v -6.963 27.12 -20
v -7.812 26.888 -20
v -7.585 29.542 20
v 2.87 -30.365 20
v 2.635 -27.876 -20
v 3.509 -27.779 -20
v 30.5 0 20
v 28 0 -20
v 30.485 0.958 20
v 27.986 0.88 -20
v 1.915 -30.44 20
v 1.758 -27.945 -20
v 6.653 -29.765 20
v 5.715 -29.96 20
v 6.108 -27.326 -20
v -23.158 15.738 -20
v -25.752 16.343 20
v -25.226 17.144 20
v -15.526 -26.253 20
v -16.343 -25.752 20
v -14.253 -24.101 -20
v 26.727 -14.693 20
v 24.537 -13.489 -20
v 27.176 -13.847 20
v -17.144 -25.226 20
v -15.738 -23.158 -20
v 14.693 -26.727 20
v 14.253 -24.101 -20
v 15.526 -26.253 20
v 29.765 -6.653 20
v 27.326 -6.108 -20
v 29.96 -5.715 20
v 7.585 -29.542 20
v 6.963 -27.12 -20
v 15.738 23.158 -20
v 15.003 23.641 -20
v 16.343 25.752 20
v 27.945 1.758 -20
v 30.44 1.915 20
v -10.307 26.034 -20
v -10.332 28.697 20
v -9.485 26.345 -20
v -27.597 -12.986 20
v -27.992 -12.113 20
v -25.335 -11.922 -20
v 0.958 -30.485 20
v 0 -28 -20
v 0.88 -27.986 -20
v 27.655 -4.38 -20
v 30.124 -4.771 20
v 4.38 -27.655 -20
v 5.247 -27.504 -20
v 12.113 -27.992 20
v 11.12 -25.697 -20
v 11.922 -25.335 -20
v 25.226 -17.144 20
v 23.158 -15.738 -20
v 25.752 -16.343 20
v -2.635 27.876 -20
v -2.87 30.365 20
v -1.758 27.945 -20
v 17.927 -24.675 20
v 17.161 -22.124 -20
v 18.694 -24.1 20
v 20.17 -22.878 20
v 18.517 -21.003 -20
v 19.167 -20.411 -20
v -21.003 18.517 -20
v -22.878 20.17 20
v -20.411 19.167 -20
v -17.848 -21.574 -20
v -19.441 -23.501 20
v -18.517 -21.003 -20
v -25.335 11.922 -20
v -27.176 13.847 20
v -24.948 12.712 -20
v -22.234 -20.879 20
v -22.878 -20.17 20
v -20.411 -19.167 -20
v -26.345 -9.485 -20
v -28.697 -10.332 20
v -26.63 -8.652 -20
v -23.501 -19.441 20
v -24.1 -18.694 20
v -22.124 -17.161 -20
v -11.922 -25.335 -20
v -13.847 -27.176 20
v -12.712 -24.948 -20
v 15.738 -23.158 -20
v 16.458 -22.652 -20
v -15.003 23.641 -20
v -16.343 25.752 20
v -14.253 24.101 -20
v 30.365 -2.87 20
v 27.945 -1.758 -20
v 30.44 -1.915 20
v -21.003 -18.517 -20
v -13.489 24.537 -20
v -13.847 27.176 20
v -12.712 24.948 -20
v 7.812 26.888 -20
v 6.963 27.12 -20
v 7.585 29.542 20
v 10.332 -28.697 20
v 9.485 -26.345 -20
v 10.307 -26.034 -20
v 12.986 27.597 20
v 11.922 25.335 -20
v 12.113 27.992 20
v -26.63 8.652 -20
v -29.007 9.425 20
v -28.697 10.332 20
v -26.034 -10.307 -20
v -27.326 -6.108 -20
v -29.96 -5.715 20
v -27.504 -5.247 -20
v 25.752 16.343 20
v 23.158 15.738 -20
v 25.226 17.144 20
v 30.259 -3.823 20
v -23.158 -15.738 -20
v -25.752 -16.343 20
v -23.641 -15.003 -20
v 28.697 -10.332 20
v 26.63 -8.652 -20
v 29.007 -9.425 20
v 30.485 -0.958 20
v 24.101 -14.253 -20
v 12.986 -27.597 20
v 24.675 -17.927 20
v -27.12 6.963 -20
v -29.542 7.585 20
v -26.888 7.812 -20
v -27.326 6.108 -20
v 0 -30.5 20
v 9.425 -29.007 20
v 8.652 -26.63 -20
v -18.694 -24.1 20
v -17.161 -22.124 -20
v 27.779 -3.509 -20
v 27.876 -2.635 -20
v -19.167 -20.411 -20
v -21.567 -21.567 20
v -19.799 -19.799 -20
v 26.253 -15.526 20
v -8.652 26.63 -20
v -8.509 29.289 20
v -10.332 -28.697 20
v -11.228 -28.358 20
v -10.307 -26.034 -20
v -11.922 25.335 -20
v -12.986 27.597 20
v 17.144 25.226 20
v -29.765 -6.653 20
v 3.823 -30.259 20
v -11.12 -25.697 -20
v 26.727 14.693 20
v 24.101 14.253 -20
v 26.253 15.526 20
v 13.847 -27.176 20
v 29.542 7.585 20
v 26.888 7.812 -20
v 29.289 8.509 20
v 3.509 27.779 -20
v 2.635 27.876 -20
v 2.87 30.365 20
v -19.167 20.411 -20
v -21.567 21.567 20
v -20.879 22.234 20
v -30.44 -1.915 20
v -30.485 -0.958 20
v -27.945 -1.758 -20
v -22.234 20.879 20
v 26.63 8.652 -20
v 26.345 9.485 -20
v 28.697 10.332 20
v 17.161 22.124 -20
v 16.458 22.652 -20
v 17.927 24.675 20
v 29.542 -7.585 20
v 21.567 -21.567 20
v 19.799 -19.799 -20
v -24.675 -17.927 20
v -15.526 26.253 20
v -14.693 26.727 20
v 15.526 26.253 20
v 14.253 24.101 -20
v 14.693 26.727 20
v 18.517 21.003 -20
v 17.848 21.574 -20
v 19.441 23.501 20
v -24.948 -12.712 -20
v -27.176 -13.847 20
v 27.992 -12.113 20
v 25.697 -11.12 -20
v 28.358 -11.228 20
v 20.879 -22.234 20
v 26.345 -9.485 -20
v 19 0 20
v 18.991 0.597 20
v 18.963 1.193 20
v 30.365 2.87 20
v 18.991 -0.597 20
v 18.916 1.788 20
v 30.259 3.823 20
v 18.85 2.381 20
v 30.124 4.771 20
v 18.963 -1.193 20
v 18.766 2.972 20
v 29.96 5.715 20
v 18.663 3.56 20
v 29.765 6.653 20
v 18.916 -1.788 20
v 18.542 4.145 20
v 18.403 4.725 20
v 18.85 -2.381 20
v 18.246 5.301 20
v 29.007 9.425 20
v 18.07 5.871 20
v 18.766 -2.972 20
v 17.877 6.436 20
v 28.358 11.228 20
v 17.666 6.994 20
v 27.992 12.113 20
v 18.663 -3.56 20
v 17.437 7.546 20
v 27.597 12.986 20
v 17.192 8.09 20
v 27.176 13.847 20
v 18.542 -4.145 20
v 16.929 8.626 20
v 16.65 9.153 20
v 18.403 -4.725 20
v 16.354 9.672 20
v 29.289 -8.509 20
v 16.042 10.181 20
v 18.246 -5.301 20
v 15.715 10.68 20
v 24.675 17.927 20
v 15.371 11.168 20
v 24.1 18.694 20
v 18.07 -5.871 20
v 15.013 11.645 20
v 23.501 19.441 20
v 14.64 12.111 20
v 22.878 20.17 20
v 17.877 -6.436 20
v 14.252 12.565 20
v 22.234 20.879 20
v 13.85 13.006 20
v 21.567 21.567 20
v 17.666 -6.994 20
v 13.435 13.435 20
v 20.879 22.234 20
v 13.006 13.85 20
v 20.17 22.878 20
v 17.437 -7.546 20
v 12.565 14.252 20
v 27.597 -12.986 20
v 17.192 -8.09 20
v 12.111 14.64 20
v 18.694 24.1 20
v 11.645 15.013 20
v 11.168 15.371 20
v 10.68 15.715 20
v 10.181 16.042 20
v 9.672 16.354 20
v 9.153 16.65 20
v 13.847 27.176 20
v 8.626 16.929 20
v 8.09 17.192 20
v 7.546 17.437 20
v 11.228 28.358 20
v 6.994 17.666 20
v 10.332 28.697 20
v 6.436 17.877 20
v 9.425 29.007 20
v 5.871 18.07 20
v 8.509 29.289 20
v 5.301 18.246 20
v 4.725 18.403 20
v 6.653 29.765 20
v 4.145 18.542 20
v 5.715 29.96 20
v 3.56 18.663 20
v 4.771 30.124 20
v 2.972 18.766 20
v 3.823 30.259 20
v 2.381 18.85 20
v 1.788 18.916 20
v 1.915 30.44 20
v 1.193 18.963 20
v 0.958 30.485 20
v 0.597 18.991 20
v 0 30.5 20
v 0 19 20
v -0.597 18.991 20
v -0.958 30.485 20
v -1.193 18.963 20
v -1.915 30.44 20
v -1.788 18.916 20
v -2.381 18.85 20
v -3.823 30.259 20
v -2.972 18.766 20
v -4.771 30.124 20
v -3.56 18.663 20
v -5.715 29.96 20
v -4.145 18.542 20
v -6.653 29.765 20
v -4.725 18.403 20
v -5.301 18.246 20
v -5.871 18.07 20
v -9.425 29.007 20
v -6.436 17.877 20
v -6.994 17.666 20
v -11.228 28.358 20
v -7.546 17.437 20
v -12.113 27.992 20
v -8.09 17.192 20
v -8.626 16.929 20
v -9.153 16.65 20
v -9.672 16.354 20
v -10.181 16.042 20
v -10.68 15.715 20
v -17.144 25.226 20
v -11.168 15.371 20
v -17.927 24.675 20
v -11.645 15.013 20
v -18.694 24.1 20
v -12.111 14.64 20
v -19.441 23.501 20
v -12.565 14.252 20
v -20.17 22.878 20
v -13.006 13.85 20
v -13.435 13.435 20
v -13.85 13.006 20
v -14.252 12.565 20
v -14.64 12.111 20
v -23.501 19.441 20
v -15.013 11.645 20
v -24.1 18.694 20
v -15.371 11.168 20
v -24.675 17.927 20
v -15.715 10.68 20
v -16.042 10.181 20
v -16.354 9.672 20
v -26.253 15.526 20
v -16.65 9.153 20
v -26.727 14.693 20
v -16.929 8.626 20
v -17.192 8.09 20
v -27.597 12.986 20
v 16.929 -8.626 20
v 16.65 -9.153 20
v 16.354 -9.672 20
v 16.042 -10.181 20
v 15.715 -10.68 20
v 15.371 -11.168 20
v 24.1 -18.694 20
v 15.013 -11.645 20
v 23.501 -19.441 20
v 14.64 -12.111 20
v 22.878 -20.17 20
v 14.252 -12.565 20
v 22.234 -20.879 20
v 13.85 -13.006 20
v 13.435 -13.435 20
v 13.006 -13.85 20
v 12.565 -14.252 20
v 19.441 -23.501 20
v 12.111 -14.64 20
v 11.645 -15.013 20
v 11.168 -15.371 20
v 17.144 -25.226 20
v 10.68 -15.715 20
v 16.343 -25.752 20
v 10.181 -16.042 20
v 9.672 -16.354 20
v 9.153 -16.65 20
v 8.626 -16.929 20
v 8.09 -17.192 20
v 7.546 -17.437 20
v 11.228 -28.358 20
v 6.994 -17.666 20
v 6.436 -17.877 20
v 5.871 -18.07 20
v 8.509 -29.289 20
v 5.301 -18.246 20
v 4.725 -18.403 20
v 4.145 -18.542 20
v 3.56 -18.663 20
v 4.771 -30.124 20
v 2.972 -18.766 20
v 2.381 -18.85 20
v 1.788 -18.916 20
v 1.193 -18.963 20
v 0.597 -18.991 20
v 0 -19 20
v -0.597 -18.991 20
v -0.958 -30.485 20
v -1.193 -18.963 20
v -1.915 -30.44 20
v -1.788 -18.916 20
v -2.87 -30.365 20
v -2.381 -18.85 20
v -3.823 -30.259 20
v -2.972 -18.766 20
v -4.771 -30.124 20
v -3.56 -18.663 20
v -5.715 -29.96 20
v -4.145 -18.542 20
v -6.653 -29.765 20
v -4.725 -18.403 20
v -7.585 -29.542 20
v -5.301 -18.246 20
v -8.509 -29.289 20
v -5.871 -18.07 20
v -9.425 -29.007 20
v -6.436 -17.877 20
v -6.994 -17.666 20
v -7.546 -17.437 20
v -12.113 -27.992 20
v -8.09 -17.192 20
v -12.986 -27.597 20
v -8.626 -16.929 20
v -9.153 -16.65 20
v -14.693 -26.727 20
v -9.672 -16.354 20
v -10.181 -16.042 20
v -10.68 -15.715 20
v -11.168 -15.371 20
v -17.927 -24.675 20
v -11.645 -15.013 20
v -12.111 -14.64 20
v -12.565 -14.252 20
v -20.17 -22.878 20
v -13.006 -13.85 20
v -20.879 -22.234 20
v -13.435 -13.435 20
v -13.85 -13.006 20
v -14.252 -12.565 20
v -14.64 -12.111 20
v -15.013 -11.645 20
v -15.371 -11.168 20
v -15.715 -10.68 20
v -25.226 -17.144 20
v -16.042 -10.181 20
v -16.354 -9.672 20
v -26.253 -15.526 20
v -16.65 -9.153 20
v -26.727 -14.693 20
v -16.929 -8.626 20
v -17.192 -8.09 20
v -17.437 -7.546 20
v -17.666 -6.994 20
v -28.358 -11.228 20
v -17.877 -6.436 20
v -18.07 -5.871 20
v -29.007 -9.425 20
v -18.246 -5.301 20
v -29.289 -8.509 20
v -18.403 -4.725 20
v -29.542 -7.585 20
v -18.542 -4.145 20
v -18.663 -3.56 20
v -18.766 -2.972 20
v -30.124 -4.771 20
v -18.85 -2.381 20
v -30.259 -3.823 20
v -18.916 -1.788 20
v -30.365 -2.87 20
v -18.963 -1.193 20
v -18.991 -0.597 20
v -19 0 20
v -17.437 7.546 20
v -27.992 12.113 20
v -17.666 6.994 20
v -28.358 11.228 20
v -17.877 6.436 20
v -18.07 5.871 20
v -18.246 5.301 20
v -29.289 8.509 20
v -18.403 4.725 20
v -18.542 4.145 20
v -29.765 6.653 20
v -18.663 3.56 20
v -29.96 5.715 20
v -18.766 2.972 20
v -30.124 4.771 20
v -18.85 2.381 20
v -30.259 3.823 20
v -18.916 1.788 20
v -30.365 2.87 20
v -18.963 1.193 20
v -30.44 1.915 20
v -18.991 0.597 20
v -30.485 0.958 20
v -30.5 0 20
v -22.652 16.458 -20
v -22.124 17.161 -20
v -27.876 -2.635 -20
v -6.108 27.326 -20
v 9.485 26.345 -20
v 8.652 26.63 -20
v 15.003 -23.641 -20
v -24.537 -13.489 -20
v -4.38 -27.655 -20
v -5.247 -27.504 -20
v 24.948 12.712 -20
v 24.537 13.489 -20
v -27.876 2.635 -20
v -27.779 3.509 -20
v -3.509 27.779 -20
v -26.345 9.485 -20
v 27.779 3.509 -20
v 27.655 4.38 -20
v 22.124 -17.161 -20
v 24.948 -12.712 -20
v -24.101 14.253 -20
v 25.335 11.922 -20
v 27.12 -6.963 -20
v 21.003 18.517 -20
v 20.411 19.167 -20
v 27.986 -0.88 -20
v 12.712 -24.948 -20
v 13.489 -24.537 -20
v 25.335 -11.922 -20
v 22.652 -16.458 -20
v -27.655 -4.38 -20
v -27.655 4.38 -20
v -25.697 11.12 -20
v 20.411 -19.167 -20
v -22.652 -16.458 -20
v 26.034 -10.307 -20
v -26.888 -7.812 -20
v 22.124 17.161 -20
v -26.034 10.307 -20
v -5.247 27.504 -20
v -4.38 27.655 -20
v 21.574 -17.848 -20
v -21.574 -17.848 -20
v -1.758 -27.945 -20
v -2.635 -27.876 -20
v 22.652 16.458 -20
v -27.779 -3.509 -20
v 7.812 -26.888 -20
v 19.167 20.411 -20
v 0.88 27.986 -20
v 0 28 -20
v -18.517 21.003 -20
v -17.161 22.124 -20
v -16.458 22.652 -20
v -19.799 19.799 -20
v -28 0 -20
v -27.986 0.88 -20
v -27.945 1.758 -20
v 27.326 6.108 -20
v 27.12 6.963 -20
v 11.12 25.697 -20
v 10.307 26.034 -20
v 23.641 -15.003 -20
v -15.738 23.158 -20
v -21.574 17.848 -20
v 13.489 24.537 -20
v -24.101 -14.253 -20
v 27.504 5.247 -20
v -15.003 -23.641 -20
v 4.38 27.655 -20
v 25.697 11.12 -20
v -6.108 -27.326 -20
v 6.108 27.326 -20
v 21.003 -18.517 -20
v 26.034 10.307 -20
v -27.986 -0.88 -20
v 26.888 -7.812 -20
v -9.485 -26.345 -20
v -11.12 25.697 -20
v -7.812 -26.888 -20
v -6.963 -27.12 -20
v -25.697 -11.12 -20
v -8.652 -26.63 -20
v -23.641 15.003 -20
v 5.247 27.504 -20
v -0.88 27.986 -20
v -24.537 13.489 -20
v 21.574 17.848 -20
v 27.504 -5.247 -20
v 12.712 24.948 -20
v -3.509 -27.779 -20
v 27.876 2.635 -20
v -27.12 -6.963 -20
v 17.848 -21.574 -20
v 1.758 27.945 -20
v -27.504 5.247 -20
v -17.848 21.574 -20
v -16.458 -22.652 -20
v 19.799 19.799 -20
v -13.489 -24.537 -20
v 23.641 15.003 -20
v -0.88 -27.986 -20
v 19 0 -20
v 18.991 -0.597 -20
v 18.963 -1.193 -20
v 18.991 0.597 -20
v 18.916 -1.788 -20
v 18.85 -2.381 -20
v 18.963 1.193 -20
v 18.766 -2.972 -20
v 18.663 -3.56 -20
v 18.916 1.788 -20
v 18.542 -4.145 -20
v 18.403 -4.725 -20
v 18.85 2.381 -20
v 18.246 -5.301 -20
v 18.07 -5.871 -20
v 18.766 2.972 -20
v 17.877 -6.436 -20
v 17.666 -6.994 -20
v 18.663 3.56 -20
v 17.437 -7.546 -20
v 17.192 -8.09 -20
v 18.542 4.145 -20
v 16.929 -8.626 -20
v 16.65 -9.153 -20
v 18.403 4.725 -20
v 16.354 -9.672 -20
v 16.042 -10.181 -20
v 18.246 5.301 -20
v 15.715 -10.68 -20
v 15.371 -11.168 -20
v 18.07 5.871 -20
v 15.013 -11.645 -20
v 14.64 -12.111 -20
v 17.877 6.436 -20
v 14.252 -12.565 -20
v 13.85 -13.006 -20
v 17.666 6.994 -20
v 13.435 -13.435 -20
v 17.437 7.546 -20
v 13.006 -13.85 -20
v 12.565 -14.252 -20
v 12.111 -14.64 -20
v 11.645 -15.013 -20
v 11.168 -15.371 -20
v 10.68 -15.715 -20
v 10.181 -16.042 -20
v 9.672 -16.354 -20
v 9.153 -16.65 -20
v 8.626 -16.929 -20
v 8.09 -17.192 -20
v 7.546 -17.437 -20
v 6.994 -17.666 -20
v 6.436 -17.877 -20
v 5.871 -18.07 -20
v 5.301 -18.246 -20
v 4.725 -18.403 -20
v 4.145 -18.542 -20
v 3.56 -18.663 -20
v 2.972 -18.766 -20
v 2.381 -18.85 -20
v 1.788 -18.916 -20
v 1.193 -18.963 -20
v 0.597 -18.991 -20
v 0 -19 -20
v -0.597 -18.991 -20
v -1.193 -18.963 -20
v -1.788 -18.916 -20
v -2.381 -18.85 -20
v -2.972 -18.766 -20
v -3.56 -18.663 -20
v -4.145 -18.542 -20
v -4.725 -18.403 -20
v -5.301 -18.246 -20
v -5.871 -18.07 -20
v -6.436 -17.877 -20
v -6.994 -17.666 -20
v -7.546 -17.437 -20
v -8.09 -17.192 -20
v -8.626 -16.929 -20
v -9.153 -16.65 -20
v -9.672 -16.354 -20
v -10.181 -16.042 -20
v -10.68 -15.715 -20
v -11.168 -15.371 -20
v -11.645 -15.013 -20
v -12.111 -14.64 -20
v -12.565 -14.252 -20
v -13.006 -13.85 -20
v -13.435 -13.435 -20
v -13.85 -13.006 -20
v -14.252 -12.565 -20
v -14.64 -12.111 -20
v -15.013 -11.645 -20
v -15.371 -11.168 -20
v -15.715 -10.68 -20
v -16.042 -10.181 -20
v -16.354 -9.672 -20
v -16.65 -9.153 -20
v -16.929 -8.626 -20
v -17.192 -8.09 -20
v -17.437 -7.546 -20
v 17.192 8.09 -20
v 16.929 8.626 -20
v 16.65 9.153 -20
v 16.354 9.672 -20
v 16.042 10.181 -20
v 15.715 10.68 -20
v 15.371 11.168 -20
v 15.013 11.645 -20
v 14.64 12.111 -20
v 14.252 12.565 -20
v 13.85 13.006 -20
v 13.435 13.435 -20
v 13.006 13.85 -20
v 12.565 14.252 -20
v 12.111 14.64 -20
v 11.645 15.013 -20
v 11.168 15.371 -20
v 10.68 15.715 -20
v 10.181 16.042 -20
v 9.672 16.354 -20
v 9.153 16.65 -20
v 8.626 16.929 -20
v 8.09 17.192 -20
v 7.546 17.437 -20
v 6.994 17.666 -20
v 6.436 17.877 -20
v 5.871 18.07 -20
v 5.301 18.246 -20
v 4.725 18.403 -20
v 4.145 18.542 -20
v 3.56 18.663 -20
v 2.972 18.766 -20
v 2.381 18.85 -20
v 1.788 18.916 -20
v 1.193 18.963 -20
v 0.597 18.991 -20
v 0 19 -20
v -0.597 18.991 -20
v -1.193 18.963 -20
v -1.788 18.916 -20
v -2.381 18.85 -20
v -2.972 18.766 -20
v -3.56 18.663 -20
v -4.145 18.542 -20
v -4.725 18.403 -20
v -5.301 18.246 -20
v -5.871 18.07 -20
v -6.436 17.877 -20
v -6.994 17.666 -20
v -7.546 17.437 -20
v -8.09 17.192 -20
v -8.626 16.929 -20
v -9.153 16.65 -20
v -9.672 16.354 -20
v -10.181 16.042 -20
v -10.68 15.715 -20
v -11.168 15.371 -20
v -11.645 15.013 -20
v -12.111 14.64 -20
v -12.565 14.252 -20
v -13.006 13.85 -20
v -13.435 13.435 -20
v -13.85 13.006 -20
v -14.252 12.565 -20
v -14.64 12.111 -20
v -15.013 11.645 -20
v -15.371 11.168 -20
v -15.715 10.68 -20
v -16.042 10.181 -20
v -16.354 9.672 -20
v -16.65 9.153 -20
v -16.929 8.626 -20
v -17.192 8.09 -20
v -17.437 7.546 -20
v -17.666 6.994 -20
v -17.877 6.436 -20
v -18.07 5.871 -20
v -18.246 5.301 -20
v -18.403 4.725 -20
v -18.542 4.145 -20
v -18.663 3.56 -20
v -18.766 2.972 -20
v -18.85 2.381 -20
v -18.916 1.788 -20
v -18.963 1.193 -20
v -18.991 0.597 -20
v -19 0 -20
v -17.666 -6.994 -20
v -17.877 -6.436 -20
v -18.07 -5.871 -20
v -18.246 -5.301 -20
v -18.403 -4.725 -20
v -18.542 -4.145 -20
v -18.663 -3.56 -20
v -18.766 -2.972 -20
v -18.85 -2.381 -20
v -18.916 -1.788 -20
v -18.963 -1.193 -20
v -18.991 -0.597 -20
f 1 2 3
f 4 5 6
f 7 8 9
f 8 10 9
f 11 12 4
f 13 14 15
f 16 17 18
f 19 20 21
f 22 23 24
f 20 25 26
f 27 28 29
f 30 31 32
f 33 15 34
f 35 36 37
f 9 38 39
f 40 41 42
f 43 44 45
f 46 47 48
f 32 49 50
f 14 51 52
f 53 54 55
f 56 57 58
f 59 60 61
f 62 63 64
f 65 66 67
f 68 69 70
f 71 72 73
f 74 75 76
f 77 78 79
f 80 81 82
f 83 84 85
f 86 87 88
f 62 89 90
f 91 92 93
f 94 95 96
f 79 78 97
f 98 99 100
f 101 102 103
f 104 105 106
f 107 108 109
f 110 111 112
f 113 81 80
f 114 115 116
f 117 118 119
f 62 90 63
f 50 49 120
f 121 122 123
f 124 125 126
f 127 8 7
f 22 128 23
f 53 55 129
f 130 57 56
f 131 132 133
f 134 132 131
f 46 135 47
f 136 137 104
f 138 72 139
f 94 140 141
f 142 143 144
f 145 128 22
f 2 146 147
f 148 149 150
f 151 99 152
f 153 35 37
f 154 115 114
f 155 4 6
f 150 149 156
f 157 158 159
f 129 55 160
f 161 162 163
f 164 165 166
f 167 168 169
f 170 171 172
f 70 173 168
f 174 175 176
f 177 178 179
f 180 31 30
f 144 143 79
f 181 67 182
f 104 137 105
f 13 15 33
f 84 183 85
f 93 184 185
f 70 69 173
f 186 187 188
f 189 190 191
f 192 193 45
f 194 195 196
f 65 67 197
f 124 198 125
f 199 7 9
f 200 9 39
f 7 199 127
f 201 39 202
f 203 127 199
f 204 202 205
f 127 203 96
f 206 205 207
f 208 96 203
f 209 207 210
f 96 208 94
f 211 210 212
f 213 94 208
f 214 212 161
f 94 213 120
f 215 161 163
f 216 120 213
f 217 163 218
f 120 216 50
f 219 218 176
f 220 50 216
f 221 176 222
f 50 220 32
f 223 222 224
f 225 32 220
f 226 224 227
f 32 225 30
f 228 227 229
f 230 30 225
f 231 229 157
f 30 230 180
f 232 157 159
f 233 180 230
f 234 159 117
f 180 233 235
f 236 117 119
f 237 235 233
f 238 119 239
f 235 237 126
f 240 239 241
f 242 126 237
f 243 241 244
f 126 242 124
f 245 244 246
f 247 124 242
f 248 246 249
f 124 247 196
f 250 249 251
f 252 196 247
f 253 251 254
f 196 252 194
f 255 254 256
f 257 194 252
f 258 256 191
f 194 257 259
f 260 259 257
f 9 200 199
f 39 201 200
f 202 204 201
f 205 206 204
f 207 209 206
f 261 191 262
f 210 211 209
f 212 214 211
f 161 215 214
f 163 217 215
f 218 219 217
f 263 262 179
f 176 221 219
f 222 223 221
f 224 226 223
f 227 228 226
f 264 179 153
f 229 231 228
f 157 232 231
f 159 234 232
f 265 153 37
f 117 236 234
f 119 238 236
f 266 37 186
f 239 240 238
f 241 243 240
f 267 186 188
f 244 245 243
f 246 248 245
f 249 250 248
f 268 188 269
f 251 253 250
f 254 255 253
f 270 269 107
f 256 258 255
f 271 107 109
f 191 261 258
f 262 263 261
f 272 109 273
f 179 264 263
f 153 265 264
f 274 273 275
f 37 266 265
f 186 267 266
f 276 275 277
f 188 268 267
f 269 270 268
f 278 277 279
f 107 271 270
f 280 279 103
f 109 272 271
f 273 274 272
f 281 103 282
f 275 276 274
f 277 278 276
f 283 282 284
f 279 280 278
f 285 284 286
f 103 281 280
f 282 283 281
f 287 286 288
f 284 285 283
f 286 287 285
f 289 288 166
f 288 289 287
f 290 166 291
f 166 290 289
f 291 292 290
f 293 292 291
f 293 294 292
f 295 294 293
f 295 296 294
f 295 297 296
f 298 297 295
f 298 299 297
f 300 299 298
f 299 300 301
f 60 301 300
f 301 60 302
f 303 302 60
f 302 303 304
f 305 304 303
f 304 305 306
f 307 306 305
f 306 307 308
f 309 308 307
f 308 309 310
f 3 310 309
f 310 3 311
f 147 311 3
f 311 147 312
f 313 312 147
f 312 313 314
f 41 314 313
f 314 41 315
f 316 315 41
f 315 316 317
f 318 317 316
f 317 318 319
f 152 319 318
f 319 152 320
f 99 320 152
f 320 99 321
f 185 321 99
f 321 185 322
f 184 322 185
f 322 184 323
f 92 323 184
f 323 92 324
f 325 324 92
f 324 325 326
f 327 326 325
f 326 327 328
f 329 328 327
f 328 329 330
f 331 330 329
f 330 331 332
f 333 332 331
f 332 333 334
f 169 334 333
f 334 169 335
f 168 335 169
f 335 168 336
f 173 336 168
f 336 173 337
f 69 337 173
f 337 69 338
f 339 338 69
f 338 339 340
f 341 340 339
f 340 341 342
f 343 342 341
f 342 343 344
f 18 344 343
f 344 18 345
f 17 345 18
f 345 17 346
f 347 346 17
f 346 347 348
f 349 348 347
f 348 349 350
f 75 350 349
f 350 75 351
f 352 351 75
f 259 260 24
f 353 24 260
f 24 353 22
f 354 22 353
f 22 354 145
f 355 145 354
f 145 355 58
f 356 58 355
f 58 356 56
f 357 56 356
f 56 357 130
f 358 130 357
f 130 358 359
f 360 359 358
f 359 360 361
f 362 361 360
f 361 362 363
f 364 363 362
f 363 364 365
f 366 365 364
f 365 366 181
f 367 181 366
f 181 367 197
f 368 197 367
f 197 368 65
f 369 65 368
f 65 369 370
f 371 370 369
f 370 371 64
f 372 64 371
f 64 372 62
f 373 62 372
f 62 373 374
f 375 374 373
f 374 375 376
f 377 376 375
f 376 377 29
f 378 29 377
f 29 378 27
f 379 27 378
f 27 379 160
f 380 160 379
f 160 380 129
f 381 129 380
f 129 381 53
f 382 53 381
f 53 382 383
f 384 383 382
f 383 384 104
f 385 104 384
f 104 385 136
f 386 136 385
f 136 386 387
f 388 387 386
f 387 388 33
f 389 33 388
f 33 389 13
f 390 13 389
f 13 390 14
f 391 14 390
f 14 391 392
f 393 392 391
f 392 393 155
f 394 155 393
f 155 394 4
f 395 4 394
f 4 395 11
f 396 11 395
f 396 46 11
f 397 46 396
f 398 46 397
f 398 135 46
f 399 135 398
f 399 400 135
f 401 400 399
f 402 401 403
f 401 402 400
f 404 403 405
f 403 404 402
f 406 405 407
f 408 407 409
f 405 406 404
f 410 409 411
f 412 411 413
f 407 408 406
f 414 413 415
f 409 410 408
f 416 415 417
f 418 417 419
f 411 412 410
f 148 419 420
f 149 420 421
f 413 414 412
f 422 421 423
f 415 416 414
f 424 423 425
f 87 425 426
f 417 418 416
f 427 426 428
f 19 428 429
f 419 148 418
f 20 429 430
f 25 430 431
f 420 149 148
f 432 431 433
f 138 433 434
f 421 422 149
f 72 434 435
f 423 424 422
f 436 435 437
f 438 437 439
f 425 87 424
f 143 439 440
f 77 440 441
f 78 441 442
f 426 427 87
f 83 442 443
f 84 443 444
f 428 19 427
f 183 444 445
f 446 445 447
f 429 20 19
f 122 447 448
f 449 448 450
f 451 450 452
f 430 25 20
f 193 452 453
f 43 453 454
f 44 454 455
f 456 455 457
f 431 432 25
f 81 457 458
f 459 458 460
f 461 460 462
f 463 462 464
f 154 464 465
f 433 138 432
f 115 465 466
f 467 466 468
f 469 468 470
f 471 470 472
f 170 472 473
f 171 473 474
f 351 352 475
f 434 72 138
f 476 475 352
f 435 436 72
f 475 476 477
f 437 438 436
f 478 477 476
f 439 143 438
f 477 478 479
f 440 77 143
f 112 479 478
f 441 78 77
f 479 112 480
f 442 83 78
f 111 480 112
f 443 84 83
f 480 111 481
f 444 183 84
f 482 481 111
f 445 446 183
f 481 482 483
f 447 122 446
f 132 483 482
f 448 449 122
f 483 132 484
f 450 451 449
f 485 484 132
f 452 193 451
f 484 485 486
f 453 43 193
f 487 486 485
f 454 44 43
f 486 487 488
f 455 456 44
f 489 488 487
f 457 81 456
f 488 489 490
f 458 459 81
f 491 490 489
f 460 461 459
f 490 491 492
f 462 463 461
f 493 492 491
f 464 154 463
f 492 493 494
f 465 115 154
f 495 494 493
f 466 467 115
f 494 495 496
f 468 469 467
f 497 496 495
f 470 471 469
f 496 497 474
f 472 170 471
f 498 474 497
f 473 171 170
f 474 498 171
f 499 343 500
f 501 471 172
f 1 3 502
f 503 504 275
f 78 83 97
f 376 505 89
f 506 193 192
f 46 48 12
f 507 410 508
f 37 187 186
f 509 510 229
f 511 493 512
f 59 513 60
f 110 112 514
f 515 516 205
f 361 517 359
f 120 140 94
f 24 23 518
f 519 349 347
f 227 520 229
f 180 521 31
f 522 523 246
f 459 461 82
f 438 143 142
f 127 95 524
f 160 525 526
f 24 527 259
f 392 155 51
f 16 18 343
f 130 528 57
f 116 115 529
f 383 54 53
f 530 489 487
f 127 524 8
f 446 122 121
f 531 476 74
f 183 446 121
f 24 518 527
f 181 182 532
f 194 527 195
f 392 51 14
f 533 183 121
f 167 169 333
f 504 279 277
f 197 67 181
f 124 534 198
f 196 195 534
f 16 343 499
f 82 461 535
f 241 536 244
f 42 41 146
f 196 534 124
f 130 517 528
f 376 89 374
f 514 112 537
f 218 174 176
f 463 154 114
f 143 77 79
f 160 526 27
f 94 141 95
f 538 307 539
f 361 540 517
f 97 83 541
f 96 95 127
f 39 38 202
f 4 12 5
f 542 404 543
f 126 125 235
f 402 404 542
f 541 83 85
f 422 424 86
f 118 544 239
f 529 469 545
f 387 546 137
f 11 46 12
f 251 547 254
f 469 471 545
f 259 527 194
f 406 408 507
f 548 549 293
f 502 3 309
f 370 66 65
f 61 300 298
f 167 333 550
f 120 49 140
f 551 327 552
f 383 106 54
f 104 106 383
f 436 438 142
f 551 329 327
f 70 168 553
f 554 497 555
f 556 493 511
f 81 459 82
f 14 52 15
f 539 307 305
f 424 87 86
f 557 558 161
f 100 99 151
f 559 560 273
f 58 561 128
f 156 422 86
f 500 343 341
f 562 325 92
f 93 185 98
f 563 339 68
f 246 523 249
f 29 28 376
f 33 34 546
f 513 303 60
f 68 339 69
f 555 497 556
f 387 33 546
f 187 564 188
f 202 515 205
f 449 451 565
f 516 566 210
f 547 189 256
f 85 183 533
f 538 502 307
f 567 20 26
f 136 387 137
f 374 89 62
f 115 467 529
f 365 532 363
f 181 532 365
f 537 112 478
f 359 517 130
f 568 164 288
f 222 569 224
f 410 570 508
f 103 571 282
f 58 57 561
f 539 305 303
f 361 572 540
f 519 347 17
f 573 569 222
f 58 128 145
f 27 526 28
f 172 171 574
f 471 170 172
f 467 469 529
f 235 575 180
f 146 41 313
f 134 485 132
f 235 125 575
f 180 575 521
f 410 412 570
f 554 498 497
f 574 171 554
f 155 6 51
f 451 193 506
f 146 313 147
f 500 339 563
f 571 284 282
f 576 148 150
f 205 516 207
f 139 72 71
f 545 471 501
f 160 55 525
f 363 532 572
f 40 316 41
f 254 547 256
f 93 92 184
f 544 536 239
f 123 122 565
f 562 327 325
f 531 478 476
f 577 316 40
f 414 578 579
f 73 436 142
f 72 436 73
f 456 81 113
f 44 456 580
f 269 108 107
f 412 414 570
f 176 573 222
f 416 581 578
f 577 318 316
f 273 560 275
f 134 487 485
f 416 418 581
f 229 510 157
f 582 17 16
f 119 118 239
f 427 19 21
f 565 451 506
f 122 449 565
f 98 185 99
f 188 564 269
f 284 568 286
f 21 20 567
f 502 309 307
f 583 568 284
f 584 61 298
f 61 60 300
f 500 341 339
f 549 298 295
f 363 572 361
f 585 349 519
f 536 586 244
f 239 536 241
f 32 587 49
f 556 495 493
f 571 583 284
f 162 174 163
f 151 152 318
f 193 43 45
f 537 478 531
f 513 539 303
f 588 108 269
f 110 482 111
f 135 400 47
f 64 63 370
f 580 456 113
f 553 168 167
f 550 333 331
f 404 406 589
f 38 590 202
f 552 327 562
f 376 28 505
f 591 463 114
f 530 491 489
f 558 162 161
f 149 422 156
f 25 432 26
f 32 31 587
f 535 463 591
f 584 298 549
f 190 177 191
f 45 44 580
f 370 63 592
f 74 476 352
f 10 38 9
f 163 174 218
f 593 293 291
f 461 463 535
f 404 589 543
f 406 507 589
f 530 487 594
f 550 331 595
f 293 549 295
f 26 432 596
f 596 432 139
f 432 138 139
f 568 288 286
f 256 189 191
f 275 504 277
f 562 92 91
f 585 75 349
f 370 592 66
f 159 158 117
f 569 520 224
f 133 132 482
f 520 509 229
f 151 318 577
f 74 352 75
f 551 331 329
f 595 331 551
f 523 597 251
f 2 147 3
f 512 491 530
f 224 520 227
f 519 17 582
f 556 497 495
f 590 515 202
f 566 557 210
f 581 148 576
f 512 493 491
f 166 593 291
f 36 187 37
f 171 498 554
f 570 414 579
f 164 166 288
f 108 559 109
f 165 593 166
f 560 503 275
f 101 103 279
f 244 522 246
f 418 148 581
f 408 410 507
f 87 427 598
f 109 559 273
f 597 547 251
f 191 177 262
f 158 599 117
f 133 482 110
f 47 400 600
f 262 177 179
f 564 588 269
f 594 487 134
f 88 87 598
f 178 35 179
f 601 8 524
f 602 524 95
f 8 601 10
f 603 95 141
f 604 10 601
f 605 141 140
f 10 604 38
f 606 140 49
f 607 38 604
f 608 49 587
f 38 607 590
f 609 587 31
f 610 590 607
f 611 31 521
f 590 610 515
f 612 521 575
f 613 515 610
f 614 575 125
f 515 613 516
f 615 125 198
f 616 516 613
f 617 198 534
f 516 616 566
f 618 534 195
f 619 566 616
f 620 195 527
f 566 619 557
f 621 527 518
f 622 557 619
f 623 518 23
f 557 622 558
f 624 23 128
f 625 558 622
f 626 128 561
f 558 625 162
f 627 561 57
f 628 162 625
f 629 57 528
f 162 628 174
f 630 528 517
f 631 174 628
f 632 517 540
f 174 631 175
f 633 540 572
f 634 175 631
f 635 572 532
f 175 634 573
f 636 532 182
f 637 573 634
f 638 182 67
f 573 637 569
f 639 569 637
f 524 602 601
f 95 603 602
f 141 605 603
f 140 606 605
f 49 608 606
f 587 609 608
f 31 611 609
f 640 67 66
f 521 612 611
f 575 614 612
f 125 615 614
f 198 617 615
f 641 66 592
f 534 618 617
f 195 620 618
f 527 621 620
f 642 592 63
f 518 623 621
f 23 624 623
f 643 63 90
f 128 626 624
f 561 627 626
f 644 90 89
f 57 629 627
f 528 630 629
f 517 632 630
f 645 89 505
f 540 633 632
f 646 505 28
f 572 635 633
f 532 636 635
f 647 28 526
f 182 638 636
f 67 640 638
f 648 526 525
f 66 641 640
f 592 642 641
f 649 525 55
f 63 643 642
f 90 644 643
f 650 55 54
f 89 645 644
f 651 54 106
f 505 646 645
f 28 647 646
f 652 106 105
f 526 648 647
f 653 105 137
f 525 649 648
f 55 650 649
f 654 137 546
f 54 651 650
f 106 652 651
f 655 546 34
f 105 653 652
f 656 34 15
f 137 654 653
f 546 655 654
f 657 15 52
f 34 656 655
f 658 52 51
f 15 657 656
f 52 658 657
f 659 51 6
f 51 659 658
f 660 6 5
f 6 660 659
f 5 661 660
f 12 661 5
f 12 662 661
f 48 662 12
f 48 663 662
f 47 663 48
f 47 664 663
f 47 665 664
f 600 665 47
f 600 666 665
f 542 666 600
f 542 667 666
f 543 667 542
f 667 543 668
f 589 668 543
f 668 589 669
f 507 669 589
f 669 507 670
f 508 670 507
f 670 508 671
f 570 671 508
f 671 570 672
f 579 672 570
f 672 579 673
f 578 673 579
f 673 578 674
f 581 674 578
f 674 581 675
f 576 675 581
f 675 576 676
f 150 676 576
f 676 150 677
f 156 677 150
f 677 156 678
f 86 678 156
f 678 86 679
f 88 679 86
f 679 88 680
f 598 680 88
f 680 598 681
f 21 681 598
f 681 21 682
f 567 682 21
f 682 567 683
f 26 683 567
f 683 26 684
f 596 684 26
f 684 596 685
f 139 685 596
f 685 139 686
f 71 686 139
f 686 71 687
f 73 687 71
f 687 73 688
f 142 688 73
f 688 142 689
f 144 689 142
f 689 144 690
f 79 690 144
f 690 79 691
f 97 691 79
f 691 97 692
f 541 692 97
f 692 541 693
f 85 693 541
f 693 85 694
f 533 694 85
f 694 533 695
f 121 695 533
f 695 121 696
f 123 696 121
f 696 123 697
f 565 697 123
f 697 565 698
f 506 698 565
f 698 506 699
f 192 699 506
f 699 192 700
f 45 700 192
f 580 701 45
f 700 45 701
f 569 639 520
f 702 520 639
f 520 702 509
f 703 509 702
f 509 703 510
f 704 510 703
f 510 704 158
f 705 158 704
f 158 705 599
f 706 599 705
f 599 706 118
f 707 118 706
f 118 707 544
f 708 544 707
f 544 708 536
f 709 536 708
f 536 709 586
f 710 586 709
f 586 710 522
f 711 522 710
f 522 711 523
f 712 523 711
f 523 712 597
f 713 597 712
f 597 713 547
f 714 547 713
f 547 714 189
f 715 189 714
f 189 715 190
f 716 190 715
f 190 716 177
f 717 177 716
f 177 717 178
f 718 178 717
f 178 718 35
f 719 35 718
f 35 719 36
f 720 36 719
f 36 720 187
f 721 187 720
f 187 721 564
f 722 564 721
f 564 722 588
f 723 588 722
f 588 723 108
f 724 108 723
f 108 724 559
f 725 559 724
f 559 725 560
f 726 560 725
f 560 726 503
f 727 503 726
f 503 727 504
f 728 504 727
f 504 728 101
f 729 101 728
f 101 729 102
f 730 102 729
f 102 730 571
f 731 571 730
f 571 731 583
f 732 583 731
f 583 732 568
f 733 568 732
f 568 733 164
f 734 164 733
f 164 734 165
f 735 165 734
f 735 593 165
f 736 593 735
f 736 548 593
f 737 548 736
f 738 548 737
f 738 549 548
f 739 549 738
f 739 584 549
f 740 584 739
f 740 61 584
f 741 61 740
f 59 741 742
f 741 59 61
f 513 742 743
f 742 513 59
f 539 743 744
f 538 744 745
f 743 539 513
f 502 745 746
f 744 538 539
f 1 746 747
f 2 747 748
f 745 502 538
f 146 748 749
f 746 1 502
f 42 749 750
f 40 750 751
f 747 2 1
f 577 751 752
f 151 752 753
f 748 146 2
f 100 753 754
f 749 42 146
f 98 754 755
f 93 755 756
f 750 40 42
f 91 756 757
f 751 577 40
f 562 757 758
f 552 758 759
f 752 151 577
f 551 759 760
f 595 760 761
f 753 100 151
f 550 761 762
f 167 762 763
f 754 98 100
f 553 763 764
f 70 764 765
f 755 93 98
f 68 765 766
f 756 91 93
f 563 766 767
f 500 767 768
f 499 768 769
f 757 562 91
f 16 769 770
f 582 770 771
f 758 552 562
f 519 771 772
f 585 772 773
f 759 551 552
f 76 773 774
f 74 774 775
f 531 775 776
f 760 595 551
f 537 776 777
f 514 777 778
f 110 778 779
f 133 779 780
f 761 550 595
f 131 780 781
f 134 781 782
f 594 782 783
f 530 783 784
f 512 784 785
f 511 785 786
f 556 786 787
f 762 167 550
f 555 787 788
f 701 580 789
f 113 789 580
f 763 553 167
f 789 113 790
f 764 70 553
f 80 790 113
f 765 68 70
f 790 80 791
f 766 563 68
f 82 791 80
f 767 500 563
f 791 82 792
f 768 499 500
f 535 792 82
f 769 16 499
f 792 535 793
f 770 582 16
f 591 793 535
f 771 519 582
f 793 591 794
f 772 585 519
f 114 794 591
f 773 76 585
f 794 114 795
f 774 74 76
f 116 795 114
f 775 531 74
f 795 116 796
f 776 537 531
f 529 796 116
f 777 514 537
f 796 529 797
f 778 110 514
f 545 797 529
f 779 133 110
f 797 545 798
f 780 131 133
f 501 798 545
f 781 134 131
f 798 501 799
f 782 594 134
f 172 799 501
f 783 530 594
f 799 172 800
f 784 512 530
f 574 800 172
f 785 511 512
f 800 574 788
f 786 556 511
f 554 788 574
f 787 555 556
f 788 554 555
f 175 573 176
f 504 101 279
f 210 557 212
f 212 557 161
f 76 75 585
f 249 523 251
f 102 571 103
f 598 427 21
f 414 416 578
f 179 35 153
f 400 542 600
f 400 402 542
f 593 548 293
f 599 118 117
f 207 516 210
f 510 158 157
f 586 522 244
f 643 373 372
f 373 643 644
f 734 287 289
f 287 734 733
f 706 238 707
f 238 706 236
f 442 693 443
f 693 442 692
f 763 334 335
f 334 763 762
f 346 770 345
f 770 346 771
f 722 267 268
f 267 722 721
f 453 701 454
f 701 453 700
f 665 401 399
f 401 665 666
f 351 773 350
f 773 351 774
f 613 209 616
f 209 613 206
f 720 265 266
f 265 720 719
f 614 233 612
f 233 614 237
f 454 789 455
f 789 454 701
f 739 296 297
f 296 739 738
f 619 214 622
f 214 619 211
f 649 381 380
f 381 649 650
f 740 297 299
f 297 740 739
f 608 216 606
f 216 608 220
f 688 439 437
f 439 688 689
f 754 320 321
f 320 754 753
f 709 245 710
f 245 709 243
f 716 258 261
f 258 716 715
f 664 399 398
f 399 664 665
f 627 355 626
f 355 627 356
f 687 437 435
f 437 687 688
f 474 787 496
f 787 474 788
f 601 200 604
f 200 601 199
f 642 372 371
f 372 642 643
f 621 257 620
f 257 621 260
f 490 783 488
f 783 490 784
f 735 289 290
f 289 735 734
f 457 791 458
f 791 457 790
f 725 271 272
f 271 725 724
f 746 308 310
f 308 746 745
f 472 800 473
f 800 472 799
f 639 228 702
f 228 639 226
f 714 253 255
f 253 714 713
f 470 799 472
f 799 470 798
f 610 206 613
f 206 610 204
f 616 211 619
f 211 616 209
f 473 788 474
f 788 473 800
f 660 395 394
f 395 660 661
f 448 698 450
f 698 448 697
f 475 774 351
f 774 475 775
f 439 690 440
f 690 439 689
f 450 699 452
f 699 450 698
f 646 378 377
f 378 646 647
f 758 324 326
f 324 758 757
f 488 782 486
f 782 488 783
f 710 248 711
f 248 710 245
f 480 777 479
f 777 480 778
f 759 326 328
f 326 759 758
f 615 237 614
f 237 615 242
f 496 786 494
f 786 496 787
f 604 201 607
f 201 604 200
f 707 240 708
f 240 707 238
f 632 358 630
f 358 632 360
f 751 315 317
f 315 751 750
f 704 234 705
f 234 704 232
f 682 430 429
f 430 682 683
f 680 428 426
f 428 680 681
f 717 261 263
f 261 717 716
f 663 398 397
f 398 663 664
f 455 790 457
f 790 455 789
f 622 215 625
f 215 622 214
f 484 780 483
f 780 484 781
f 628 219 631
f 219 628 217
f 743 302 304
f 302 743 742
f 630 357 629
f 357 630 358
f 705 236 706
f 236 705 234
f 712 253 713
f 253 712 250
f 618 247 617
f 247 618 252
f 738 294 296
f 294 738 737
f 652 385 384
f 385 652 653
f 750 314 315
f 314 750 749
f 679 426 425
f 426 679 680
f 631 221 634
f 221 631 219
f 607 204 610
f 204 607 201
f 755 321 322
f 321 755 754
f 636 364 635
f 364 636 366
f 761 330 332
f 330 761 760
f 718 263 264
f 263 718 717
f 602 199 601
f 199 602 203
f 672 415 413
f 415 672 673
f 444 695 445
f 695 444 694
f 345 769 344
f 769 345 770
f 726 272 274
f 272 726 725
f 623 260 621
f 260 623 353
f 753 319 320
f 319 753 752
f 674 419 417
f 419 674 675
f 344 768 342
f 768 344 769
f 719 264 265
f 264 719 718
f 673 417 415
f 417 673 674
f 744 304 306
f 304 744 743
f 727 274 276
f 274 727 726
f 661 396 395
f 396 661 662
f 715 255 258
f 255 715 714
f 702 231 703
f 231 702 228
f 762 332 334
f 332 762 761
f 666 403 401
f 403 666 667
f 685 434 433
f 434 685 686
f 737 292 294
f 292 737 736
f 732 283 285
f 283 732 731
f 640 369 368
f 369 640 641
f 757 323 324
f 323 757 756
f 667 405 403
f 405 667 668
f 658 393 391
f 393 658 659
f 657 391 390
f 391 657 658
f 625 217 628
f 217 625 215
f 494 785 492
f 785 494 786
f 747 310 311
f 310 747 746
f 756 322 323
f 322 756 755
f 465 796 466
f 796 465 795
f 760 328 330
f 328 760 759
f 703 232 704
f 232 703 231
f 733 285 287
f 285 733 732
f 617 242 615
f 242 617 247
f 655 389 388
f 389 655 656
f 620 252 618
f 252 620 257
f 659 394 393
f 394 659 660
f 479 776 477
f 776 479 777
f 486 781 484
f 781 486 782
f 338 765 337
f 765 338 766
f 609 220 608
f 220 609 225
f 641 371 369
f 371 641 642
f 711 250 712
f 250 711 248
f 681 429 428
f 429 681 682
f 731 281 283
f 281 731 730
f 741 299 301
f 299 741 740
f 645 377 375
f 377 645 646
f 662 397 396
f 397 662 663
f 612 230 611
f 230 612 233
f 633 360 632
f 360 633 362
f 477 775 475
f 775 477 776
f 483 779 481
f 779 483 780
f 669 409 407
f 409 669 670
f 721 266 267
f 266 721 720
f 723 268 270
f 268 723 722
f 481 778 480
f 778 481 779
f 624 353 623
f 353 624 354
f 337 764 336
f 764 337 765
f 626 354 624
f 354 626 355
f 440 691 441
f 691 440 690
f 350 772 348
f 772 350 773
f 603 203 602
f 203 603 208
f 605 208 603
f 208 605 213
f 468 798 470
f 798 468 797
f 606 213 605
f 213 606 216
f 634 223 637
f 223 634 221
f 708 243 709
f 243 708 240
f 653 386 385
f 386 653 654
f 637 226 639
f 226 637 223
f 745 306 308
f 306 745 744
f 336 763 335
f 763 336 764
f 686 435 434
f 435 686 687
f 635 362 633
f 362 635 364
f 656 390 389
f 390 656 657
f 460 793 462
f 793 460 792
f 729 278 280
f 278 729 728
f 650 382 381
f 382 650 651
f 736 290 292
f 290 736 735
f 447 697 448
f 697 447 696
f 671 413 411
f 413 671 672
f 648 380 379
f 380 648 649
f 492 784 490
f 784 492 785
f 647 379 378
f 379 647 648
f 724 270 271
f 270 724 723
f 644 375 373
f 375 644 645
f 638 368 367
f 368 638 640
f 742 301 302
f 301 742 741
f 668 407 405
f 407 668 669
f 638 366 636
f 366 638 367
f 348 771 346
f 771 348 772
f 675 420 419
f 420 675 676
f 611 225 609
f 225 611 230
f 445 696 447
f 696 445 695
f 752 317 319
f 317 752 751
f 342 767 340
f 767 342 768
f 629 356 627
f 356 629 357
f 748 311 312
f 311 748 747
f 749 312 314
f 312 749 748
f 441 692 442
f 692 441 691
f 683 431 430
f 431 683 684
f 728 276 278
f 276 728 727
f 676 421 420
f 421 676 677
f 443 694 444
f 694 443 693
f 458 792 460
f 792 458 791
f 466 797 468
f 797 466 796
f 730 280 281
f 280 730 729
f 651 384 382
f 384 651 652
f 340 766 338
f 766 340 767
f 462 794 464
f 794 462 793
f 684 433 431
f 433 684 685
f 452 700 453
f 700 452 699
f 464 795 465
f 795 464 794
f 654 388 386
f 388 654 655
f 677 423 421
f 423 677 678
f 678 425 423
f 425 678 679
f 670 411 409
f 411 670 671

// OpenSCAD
$fn=200;

difference() {
    cylinder(h=40, r2=30.5, r1=28, center=true);
    cylinder(h=50, r=19, center=true); 
}
